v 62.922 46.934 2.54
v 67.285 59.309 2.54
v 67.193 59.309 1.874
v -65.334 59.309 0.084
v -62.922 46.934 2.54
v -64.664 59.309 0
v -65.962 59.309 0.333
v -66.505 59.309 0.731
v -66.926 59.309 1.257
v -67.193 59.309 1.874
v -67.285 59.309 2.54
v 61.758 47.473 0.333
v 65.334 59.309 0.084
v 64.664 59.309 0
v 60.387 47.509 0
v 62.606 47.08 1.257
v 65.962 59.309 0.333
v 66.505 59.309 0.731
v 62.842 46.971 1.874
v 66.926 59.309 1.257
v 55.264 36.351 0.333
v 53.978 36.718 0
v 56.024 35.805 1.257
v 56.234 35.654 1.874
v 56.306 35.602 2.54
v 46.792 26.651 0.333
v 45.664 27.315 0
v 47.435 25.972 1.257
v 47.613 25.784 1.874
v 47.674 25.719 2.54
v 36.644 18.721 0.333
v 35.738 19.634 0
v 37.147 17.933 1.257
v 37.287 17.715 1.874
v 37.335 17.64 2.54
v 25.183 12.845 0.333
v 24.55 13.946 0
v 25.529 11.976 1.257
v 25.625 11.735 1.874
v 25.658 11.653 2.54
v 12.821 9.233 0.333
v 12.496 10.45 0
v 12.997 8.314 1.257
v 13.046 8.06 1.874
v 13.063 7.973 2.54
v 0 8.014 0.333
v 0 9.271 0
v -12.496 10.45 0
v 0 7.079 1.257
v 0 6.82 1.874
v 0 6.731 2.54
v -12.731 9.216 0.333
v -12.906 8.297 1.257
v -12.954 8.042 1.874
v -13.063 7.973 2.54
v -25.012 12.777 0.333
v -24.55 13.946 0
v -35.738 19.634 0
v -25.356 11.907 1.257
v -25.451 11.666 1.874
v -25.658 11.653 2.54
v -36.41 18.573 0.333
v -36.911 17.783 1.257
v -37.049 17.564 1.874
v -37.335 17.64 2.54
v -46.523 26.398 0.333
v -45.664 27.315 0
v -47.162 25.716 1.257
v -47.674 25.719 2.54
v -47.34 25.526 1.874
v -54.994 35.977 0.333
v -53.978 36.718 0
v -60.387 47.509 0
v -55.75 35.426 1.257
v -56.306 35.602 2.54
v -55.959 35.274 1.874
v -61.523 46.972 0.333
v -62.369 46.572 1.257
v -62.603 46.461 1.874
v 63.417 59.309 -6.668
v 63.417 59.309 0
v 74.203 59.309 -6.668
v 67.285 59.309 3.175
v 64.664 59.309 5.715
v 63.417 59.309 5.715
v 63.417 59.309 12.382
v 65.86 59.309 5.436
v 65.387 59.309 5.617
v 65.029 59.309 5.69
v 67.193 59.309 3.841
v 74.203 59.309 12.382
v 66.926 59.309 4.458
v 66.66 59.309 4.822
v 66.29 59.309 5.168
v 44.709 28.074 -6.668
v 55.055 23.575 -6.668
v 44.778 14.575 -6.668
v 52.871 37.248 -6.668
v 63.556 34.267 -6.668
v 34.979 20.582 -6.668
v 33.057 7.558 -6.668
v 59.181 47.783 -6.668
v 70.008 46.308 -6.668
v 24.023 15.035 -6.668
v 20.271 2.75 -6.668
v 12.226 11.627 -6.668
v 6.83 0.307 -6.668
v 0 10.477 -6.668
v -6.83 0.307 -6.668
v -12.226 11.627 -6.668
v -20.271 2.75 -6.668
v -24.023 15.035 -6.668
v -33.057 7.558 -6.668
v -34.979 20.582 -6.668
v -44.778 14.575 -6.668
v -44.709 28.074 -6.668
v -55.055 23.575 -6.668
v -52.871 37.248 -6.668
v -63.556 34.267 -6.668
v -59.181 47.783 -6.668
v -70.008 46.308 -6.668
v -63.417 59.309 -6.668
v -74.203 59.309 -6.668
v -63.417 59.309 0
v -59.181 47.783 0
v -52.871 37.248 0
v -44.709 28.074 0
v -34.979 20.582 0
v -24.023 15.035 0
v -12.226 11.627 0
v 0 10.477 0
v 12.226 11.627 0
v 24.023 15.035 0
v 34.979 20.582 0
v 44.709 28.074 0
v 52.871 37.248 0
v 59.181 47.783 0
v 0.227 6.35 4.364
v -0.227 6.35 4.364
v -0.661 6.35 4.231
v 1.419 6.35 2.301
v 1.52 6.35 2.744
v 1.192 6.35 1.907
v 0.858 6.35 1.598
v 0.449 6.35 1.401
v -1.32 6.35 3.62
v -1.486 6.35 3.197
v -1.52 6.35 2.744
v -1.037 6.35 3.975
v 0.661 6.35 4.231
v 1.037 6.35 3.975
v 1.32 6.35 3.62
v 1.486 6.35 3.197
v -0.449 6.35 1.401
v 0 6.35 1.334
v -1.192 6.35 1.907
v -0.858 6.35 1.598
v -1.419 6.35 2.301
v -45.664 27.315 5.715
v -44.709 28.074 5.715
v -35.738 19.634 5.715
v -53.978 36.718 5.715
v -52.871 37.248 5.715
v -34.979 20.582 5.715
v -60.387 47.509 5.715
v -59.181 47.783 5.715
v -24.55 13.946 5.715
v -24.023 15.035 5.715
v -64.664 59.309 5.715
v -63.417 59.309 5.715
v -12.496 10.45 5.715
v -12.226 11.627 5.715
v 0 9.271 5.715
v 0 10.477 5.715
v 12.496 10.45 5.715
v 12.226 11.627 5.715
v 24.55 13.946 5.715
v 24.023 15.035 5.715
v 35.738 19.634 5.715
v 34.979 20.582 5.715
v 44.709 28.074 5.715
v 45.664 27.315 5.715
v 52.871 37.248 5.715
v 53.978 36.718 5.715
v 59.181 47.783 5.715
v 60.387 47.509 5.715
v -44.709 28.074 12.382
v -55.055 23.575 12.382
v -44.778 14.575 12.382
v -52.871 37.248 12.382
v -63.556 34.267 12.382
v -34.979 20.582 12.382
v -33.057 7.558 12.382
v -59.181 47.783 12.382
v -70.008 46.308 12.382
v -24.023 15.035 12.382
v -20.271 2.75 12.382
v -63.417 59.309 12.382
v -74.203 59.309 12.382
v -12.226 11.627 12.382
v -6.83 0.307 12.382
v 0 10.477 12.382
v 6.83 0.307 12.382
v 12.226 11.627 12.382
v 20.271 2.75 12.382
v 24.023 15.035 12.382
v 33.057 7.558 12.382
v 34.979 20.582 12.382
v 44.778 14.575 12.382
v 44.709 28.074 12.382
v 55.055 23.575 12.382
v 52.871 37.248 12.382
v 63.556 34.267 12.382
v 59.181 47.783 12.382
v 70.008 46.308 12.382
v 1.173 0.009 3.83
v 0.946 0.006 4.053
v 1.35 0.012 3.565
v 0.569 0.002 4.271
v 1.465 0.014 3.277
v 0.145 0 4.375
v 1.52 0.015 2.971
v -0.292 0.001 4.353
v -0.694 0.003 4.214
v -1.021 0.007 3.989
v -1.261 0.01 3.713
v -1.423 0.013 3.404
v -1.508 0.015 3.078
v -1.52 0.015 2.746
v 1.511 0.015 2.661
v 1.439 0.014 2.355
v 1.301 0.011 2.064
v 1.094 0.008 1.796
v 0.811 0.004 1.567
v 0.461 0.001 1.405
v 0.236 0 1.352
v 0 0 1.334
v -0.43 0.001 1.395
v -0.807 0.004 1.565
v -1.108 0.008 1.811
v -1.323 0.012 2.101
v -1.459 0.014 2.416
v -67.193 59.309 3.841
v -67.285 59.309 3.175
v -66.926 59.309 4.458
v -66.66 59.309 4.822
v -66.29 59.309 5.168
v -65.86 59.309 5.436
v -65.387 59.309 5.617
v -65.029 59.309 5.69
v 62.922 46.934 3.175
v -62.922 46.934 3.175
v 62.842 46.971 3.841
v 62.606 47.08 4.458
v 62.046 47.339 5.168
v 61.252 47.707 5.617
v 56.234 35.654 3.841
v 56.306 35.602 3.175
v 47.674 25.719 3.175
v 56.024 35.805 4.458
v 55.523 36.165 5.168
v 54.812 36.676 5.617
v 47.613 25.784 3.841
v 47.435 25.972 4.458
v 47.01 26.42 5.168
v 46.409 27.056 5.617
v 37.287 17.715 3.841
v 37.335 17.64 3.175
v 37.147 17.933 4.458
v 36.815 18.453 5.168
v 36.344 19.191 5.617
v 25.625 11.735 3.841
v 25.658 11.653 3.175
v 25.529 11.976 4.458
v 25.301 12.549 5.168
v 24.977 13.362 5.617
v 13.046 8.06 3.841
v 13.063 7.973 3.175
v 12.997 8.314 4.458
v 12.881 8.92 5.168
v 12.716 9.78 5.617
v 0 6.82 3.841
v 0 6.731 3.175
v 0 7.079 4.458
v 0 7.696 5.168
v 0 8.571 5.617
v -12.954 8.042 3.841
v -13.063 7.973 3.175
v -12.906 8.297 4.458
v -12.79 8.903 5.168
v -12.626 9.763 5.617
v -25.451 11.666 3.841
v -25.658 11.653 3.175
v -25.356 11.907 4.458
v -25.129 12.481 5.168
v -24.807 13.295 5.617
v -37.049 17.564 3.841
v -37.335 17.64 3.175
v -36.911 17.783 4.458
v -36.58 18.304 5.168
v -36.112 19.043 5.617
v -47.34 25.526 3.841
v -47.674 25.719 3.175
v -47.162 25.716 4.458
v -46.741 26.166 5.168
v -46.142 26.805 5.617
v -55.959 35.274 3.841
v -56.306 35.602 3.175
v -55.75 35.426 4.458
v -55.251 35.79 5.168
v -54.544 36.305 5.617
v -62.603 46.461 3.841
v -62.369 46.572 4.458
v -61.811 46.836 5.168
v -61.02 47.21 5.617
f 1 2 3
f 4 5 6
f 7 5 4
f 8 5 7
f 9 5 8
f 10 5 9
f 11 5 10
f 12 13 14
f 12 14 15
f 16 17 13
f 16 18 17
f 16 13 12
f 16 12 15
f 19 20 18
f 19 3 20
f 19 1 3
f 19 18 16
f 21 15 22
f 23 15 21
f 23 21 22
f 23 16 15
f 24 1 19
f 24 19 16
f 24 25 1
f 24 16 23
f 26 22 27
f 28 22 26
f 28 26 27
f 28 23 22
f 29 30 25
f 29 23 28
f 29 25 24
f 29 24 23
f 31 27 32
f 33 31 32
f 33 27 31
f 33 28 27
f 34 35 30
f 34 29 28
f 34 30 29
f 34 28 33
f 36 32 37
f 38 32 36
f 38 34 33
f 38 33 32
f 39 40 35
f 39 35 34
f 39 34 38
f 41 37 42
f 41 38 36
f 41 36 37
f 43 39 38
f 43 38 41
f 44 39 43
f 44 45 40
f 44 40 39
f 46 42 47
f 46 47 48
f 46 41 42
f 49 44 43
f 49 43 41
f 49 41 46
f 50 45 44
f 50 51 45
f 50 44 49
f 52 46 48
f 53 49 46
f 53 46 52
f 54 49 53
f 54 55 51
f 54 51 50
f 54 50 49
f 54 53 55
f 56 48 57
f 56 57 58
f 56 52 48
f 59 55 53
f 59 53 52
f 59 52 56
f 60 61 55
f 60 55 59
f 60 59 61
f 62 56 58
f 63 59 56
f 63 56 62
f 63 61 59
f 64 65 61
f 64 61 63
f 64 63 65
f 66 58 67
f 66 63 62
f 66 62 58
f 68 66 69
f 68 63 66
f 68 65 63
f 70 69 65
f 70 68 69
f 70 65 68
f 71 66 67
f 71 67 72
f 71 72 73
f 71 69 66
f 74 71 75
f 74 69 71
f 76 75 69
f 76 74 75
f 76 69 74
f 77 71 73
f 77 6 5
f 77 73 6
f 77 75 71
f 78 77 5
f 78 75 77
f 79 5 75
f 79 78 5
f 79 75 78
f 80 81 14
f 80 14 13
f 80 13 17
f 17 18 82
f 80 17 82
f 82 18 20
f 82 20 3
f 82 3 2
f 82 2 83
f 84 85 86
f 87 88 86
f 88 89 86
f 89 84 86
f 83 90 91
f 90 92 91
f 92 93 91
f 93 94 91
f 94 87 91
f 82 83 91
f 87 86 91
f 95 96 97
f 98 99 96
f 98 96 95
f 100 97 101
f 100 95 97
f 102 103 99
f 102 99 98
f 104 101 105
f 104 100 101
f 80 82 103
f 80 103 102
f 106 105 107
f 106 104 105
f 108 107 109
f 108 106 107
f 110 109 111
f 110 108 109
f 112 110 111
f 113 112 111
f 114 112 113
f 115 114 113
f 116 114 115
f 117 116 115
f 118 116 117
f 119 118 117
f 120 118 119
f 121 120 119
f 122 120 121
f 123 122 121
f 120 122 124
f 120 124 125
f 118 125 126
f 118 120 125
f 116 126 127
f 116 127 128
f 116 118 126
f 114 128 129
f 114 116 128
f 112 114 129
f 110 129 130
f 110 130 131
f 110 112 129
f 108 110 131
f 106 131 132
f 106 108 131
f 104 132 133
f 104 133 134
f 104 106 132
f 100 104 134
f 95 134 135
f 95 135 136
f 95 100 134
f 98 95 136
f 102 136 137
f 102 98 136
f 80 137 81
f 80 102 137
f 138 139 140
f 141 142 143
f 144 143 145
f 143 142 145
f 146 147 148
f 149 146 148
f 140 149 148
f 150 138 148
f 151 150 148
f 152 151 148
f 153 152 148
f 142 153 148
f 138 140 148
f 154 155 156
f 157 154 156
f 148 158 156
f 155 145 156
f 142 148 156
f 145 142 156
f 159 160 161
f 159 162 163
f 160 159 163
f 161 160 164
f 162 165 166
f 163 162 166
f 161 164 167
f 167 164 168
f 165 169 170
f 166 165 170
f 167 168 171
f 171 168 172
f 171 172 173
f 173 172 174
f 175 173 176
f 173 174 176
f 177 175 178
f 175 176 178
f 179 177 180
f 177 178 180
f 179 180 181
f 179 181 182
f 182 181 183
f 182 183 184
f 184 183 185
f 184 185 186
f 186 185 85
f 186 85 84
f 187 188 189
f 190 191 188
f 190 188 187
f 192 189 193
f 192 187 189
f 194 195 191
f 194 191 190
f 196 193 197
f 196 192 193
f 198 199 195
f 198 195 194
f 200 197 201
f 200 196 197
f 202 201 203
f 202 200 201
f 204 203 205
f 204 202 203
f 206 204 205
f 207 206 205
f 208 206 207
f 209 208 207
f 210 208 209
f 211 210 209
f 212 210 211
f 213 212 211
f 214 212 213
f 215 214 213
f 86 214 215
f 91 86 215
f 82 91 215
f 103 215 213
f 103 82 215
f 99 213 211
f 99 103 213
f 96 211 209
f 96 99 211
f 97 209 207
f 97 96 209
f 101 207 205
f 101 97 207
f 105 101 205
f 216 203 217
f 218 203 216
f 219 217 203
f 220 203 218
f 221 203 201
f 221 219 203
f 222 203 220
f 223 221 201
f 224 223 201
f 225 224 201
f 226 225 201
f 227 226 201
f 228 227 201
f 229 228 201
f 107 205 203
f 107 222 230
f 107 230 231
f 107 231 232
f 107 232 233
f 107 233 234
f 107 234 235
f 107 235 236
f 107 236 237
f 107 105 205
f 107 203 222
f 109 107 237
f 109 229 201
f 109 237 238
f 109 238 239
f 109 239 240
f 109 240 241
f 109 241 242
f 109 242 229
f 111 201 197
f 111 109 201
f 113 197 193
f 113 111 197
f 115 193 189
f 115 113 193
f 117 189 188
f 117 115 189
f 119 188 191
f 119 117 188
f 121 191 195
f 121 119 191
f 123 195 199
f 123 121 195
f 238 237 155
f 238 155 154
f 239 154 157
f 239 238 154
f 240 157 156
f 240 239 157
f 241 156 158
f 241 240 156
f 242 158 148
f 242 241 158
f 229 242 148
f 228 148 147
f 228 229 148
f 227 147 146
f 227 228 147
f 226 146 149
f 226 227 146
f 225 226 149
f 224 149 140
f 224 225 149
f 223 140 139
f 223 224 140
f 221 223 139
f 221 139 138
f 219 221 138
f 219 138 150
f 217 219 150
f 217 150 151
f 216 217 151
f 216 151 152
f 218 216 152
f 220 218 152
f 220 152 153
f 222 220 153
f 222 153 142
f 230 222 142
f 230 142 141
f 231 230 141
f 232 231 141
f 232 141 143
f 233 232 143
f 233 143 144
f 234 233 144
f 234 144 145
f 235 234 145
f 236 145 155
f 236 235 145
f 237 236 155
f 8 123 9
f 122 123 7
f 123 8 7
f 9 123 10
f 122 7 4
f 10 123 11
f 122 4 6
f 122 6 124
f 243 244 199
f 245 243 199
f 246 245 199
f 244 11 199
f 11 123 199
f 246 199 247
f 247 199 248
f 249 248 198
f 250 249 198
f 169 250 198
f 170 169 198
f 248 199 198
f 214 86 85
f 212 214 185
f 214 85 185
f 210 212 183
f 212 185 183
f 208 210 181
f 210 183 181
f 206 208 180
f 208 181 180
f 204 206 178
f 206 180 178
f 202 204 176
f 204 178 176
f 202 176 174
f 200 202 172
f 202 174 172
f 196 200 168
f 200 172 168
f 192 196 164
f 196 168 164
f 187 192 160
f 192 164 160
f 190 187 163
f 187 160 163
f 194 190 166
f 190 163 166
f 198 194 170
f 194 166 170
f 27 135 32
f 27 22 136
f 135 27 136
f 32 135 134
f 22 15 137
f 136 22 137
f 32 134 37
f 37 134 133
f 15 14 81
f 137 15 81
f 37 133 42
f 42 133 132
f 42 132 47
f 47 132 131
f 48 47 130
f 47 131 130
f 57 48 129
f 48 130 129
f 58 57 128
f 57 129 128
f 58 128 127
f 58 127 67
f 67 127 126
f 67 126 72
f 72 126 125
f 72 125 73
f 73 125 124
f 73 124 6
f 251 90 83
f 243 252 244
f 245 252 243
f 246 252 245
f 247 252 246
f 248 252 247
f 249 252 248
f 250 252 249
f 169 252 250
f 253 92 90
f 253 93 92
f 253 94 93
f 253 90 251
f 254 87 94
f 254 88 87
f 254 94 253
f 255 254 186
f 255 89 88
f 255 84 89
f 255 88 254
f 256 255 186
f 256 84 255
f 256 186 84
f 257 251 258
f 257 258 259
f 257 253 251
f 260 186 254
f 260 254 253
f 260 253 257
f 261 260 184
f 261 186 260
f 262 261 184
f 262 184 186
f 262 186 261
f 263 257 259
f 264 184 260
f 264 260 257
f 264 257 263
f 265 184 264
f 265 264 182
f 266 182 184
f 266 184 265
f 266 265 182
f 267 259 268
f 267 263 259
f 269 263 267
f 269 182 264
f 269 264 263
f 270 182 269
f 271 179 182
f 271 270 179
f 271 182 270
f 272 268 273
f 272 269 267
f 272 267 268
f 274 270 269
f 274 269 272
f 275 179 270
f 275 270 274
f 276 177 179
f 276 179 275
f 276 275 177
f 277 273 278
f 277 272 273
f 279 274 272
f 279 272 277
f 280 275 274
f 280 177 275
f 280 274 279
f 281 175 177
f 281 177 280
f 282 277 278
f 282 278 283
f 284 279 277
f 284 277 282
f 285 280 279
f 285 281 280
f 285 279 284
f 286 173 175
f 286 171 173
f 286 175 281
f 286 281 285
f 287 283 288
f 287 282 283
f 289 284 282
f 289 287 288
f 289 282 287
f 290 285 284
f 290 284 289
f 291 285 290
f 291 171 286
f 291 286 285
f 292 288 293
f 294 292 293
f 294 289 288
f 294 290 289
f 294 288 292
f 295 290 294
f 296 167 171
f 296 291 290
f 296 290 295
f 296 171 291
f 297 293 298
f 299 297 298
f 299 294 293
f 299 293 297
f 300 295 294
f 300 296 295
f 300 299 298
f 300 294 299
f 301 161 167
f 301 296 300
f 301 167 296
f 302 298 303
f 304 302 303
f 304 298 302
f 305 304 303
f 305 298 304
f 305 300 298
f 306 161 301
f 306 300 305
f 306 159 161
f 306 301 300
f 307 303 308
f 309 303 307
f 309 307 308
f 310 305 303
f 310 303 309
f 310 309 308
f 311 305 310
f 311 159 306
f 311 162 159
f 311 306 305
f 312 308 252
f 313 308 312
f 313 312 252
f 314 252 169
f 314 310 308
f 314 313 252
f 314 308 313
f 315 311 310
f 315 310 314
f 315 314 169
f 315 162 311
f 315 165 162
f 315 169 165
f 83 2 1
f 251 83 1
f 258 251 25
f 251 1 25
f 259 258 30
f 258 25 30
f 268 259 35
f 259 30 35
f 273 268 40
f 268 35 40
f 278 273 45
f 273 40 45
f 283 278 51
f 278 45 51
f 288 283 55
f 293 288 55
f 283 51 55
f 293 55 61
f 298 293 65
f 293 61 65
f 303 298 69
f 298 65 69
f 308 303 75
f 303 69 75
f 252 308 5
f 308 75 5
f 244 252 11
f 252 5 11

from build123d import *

# Parameters (mm, degrees)
BOSS_EXTRUDE1_DEPTH = 5.715
BOSS_EXTRUDE2_DEPTH = 6.6675
BOSS_EXTRUDE3_START = 6.6675
BOSS_EXTRUDE3_DEPTH = 6.6675
FILLET1_R           = 2.54
SKETCH5_R           = 1.524
CUT_EXTRUDE1_DEPTH  = 6.35
CUT_EXTRUDE2_DEPTH  = 110.257060148


with BuildPart() as part:
    # Sketch1 → Boss-Extrude1 (new body)
    with BuildSketch(Plane.XY):
        with BuildLine():
            ThreePointArc((69.342, 76.073), (0, 6.731), (-69.342, 76.073))
            Line((-69.342, 76.073), (-76.073, 76.073))
            ThreePointArc((-76.073, 76.073), (0, 0), (76.073, 76.073))
            Line((76.073, 76.073), (69.342, 76.073))
        make_face()
    extrude(amount=BOSS_EXTRUDE1_DEPTH)

    # Sketch3 → Boss-Extrude2 (add)
    with BuildSketch(Plane.XY.offset(5.715)):
        with BuildLine():
            ThreePointArc((65.5955, 76.073), (0, 10.4775), (-65.5955, 76.073))
            Line((-65.5955, 76.073), (-69.342, 76.073))
            ThreePointArc((-69.342, 76.073), (0, 6.731), (69.342, 76.073))
            Line((69.342, 76.073), (65.5955, 76.073))
        make_face()
        with BuildLine():
            Line((76.073, 76.073), (69.342, 76.073))
            ThreePointArc((69.342, 76.073), (0, 6.731), (-69.342, 76.073))
            Line((-69.342, 76.073), (-76.073, 76.073))
            ThreePointArc((-76.073, 76.073), (0, 0), (76.073, 76.073))
        make_face()
    extrude(amount=BOSS_EXTRUDE2_DEPTH)

    # Sketch4 → Boss-Extrude3 (add)
    with BuildSketch(Plane(origin=(0, 0, 0), x_dir=(-1, 0, 0), z_dir=(0, 0, -1)).offset(BOSS_EXTRUDE3_START)):
        with BuildLine():
            ThreePointArc((65.5955, 76.073), (0, 10.4775), (-65.5955, 76.073))
            Line((-65.5955, 76.073), (-69.342, 76.073))
            ThreePointArc((-69.342, 76.073), (0, 6.731), (69.342, 76.073))
            Line((69.342, 76.073), (65.5955, 76.073))
        make_face()
        with BuildLine():
            Line((76.073, 76.073), (69.342, 76.073))
            ThreePointArc((69.342, 76.073), (0, 6.731), (-69.342, 76.073))
            Line((-69.342, 76.073), (-76.073, 76.073))
            ThreePointArc((-76.073, 76.073), (0, 0), (76.073, 76.073))
        make_face()
    extrude(amount=-BOSS_EXTRUDE3_DEPTH)

    # Fillet1
    fillet1_edges = [part.edges().sort_by_distance(p)[0] for p in [
        (0, 6.731, 5.715),
        (0, 6.731, 0),
    ]]
    fillet(fillet1_edges, radius=FILLET1_R)

    # Sketch5 → Cut-Extrude1 (cut)
    with BuildSketch(Plane(origin=(0, 0, 0), x_dir=(1, 0, 0), z_dir=(0, 1, 0))):
        with Locations(Location((0, -2.8575, 0), (0, 0, 90))):
            Circle(SKETCH5_R)
    extrude(amount=CUT_EXTRUDE1_DEPTH, mode=Mode.SUBTRACT)

    # Sketch6 → Cut-Extrude2 (cut, through all)
    with BuildSketch(Plane.XY.offset(12.3825)):
        with BuildLine():
            ThreePointArc((-76.073, 76.073), (-75.604028212, 67.639006454), (-74.202895045, 59.309))
            Line((-74.202895045, 59.309), (-63.417173733, 59.309))
            ThreePointArc((-63.417173733, 59.309), (-65.048638878, 67.620532885), (-65.5955, 76.073))
            Line((-65.5955, 76.073), (-76.073, 76.073))
        make_face()
        with BuildLine():
            ThreePointArc((74.202895045, 59.309), (75.604028212, 67.639006454), (76.073, 76.073))
            Line((76.073, 76.073), (65.5955, 76.073))
            ThreePointArc((65.5955, 76.073), (65.048638878, 67.620532885), (63.417173733, 59.309))
            Line((63.417173733, 59.309), (74.202895045, 59.309))
        make_face()
    extrude(amount=-CUT_EXTRUDE2_DEPTH, mode=Mode.SUBTRACT)


solid = part.part
